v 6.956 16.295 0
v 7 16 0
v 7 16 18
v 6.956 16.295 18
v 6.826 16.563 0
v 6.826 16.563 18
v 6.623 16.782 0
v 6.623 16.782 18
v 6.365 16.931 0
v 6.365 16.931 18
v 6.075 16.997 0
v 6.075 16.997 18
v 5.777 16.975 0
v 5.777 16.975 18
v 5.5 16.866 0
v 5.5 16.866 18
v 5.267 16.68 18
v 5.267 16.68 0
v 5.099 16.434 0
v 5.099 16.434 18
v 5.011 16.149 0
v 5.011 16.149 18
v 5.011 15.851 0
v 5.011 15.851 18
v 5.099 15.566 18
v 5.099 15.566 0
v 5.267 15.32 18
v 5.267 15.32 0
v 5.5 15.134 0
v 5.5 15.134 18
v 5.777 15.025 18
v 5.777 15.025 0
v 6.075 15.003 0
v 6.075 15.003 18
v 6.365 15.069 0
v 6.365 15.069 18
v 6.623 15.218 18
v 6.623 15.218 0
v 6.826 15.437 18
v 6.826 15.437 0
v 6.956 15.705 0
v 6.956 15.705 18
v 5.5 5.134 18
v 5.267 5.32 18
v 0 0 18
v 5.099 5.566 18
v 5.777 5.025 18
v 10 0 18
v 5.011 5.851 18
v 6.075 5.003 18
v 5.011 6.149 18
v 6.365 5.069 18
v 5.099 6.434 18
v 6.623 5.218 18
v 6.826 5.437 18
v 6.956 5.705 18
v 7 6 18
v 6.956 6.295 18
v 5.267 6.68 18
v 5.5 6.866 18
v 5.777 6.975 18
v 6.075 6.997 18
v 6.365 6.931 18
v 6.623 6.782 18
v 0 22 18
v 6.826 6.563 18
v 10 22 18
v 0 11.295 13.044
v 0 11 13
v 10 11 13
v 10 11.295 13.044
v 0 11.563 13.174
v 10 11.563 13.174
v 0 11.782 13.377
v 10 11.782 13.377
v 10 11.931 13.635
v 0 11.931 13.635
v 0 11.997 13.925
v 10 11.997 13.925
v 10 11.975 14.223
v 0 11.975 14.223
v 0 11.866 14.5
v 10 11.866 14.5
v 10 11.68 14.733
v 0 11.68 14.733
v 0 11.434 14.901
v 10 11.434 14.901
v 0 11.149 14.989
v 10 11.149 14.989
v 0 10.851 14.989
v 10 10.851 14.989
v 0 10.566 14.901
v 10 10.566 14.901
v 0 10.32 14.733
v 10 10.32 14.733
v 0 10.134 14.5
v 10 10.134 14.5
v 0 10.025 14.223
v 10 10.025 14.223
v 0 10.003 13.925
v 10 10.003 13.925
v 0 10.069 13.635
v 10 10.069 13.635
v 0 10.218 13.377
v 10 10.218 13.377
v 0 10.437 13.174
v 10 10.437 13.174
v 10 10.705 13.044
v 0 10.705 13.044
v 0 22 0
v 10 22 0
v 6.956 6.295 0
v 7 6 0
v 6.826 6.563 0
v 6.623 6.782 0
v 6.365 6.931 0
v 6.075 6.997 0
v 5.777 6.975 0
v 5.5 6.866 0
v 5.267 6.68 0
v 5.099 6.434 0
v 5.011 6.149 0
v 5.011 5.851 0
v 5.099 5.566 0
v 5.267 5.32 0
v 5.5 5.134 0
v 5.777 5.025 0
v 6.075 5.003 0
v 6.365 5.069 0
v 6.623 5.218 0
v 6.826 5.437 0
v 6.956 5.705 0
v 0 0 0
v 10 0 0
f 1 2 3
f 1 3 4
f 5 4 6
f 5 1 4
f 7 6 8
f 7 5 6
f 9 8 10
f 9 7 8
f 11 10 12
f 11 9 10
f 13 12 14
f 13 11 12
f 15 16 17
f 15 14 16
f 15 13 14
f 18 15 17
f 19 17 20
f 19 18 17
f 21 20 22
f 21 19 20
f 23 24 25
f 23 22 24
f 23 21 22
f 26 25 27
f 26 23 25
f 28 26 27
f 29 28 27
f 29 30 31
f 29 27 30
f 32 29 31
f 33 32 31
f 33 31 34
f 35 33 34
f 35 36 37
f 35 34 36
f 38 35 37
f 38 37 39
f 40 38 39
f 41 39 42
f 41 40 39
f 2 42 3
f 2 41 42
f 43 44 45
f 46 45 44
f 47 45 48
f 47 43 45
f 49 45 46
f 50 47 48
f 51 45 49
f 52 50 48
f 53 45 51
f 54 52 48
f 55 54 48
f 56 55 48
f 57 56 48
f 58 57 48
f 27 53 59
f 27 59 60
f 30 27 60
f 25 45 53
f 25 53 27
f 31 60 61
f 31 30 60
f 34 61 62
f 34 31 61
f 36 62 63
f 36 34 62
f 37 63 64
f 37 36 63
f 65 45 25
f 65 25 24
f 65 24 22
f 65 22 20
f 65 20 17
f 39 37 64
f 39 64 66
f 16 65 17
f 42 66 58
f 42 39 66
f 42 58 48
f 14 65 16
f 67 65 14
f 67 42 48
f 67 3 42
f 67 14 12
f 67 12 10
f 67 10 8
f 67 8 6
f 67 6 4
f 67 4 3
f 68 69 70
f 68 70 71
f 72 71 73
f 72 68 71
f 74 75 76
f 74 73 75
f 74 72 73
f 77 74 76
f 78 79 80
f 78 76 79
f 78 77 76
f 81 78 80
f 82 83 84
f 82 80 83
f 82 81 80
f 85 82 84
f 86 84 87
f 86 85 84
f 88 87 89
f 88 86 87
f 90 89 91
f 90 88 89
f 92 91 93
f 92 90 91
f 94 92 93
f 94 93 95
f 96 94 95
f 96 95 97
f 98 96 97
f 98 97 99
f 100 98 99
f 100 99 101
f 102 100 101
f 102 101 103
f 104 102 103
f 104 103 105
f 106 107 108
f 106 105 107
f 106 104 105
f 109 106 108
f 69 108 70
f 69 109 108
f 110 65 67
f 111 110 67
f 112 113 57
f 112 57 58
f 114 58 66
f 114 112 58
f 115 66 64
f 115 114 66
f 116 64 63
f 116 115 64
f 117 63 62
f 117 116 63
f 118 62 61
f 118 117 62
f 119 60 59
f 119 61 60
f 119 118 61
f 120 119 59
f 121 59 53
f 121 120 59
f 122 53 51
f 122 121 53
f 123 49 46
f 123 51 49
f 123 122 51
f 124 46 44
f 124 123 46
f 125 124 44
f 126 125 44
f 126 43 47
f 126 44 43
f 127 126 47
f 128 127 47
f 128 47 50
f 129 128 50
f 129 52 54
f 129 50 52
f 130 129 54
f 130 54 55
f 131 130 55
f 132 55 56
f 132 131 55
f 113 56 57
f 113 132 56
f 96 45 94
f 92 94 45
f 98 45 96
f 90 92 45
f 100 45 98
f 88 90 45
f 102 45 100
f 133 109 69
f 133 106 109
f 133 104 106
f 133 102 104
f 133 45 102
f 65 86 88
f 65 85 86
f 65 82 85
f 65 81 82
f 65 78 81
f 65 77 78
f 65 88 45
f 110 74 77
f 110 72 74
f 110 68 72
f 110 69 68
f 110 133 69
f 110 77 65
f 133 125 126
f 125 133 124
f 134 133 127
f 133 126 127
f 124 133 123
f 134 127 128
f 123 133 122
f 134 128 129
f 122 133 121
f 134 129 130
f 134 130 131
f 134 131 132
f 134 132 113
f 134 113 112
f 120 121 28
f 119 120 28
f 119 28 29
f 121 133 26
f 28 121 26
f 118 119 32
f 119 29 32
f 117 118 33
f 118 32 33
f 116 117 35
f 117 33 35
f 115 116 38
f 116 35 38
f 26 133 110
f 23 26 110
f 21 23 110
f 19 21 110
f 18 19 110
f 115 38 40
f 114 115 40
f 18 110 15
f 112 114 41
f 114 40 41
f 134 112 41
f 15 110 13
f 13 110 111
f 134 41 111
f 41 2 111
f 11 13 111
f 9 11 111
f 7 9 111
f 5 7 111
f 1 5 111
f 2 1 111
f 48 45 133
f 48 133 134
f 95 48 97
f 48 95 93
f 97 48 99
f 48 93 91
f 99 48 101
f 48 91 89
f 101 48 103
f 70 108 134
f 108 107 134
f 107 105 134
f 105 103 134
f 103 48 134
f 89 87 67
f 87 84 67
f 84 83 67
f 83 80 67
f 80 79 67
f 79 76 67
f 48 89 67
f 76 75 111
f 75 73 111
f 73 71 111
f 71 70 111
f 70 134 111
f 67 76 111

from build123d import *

# Parameters (mm, degrees)
CYLINDER001_R     = 1
CYLINDER001_DEPTH = 50
CYLINDER_R        = 1
CYLINDER_DEPTH    = 50
ARRAY_Y_COUNT     = 2
ARRAY_Y_PITCH     = 10
BOX_W             = 10
BOX_H             = 22
BOX_DEPTH         = 18


with BuildPart() as cylinder001:
    # Cylinder001 → Cylinder001 (new body)
    with BuildSketch(Plane(origin=(-10, 11, 14), x_dir=(0, 0, -1), z_dir=(1, 0, 0))):
        Circle(CYLINDER001_R)
    extrude(amount=CYLINDER001_DEPTH)


with BuildPart() as fusion:
    # Cylinder → Cylinder (new body)
    with BuildSketch(Plane.XY.offset(-10)):
        Circle(CYLINDER_R)
    extrude(amount=CYLINDER_DEPTH)

    # Array Y: Fusion ×2


with BuildPart() as fusion_1:
    add(fusion.part)
    with Locations(*[(0, i * ARRAY_Y_PITCH, 0) for i in range(1, ARRAY_Y_COUNT)]):
        add(fusion.part)


with BuildPart() as fusion_2:
    # Array placement: moved
    add(fusion_1.part.moved(Location((6, 6, 0))))

    # Fusion: union Cylinder001
    add(cylinder001.part)


with BuildPart() as cut:
    # Box → Box (new body)
    with BuildSketch(Plane.XY):
        with Locations((5, 11)):
            Rectangle(BOX_W, BOX_H)
    extrude(amount=BOX_DEPTH)

    # Cut: cut Fusion
    add(fusion_2.part, mode=Mode.SUBTRACT)


solid = cut.part
